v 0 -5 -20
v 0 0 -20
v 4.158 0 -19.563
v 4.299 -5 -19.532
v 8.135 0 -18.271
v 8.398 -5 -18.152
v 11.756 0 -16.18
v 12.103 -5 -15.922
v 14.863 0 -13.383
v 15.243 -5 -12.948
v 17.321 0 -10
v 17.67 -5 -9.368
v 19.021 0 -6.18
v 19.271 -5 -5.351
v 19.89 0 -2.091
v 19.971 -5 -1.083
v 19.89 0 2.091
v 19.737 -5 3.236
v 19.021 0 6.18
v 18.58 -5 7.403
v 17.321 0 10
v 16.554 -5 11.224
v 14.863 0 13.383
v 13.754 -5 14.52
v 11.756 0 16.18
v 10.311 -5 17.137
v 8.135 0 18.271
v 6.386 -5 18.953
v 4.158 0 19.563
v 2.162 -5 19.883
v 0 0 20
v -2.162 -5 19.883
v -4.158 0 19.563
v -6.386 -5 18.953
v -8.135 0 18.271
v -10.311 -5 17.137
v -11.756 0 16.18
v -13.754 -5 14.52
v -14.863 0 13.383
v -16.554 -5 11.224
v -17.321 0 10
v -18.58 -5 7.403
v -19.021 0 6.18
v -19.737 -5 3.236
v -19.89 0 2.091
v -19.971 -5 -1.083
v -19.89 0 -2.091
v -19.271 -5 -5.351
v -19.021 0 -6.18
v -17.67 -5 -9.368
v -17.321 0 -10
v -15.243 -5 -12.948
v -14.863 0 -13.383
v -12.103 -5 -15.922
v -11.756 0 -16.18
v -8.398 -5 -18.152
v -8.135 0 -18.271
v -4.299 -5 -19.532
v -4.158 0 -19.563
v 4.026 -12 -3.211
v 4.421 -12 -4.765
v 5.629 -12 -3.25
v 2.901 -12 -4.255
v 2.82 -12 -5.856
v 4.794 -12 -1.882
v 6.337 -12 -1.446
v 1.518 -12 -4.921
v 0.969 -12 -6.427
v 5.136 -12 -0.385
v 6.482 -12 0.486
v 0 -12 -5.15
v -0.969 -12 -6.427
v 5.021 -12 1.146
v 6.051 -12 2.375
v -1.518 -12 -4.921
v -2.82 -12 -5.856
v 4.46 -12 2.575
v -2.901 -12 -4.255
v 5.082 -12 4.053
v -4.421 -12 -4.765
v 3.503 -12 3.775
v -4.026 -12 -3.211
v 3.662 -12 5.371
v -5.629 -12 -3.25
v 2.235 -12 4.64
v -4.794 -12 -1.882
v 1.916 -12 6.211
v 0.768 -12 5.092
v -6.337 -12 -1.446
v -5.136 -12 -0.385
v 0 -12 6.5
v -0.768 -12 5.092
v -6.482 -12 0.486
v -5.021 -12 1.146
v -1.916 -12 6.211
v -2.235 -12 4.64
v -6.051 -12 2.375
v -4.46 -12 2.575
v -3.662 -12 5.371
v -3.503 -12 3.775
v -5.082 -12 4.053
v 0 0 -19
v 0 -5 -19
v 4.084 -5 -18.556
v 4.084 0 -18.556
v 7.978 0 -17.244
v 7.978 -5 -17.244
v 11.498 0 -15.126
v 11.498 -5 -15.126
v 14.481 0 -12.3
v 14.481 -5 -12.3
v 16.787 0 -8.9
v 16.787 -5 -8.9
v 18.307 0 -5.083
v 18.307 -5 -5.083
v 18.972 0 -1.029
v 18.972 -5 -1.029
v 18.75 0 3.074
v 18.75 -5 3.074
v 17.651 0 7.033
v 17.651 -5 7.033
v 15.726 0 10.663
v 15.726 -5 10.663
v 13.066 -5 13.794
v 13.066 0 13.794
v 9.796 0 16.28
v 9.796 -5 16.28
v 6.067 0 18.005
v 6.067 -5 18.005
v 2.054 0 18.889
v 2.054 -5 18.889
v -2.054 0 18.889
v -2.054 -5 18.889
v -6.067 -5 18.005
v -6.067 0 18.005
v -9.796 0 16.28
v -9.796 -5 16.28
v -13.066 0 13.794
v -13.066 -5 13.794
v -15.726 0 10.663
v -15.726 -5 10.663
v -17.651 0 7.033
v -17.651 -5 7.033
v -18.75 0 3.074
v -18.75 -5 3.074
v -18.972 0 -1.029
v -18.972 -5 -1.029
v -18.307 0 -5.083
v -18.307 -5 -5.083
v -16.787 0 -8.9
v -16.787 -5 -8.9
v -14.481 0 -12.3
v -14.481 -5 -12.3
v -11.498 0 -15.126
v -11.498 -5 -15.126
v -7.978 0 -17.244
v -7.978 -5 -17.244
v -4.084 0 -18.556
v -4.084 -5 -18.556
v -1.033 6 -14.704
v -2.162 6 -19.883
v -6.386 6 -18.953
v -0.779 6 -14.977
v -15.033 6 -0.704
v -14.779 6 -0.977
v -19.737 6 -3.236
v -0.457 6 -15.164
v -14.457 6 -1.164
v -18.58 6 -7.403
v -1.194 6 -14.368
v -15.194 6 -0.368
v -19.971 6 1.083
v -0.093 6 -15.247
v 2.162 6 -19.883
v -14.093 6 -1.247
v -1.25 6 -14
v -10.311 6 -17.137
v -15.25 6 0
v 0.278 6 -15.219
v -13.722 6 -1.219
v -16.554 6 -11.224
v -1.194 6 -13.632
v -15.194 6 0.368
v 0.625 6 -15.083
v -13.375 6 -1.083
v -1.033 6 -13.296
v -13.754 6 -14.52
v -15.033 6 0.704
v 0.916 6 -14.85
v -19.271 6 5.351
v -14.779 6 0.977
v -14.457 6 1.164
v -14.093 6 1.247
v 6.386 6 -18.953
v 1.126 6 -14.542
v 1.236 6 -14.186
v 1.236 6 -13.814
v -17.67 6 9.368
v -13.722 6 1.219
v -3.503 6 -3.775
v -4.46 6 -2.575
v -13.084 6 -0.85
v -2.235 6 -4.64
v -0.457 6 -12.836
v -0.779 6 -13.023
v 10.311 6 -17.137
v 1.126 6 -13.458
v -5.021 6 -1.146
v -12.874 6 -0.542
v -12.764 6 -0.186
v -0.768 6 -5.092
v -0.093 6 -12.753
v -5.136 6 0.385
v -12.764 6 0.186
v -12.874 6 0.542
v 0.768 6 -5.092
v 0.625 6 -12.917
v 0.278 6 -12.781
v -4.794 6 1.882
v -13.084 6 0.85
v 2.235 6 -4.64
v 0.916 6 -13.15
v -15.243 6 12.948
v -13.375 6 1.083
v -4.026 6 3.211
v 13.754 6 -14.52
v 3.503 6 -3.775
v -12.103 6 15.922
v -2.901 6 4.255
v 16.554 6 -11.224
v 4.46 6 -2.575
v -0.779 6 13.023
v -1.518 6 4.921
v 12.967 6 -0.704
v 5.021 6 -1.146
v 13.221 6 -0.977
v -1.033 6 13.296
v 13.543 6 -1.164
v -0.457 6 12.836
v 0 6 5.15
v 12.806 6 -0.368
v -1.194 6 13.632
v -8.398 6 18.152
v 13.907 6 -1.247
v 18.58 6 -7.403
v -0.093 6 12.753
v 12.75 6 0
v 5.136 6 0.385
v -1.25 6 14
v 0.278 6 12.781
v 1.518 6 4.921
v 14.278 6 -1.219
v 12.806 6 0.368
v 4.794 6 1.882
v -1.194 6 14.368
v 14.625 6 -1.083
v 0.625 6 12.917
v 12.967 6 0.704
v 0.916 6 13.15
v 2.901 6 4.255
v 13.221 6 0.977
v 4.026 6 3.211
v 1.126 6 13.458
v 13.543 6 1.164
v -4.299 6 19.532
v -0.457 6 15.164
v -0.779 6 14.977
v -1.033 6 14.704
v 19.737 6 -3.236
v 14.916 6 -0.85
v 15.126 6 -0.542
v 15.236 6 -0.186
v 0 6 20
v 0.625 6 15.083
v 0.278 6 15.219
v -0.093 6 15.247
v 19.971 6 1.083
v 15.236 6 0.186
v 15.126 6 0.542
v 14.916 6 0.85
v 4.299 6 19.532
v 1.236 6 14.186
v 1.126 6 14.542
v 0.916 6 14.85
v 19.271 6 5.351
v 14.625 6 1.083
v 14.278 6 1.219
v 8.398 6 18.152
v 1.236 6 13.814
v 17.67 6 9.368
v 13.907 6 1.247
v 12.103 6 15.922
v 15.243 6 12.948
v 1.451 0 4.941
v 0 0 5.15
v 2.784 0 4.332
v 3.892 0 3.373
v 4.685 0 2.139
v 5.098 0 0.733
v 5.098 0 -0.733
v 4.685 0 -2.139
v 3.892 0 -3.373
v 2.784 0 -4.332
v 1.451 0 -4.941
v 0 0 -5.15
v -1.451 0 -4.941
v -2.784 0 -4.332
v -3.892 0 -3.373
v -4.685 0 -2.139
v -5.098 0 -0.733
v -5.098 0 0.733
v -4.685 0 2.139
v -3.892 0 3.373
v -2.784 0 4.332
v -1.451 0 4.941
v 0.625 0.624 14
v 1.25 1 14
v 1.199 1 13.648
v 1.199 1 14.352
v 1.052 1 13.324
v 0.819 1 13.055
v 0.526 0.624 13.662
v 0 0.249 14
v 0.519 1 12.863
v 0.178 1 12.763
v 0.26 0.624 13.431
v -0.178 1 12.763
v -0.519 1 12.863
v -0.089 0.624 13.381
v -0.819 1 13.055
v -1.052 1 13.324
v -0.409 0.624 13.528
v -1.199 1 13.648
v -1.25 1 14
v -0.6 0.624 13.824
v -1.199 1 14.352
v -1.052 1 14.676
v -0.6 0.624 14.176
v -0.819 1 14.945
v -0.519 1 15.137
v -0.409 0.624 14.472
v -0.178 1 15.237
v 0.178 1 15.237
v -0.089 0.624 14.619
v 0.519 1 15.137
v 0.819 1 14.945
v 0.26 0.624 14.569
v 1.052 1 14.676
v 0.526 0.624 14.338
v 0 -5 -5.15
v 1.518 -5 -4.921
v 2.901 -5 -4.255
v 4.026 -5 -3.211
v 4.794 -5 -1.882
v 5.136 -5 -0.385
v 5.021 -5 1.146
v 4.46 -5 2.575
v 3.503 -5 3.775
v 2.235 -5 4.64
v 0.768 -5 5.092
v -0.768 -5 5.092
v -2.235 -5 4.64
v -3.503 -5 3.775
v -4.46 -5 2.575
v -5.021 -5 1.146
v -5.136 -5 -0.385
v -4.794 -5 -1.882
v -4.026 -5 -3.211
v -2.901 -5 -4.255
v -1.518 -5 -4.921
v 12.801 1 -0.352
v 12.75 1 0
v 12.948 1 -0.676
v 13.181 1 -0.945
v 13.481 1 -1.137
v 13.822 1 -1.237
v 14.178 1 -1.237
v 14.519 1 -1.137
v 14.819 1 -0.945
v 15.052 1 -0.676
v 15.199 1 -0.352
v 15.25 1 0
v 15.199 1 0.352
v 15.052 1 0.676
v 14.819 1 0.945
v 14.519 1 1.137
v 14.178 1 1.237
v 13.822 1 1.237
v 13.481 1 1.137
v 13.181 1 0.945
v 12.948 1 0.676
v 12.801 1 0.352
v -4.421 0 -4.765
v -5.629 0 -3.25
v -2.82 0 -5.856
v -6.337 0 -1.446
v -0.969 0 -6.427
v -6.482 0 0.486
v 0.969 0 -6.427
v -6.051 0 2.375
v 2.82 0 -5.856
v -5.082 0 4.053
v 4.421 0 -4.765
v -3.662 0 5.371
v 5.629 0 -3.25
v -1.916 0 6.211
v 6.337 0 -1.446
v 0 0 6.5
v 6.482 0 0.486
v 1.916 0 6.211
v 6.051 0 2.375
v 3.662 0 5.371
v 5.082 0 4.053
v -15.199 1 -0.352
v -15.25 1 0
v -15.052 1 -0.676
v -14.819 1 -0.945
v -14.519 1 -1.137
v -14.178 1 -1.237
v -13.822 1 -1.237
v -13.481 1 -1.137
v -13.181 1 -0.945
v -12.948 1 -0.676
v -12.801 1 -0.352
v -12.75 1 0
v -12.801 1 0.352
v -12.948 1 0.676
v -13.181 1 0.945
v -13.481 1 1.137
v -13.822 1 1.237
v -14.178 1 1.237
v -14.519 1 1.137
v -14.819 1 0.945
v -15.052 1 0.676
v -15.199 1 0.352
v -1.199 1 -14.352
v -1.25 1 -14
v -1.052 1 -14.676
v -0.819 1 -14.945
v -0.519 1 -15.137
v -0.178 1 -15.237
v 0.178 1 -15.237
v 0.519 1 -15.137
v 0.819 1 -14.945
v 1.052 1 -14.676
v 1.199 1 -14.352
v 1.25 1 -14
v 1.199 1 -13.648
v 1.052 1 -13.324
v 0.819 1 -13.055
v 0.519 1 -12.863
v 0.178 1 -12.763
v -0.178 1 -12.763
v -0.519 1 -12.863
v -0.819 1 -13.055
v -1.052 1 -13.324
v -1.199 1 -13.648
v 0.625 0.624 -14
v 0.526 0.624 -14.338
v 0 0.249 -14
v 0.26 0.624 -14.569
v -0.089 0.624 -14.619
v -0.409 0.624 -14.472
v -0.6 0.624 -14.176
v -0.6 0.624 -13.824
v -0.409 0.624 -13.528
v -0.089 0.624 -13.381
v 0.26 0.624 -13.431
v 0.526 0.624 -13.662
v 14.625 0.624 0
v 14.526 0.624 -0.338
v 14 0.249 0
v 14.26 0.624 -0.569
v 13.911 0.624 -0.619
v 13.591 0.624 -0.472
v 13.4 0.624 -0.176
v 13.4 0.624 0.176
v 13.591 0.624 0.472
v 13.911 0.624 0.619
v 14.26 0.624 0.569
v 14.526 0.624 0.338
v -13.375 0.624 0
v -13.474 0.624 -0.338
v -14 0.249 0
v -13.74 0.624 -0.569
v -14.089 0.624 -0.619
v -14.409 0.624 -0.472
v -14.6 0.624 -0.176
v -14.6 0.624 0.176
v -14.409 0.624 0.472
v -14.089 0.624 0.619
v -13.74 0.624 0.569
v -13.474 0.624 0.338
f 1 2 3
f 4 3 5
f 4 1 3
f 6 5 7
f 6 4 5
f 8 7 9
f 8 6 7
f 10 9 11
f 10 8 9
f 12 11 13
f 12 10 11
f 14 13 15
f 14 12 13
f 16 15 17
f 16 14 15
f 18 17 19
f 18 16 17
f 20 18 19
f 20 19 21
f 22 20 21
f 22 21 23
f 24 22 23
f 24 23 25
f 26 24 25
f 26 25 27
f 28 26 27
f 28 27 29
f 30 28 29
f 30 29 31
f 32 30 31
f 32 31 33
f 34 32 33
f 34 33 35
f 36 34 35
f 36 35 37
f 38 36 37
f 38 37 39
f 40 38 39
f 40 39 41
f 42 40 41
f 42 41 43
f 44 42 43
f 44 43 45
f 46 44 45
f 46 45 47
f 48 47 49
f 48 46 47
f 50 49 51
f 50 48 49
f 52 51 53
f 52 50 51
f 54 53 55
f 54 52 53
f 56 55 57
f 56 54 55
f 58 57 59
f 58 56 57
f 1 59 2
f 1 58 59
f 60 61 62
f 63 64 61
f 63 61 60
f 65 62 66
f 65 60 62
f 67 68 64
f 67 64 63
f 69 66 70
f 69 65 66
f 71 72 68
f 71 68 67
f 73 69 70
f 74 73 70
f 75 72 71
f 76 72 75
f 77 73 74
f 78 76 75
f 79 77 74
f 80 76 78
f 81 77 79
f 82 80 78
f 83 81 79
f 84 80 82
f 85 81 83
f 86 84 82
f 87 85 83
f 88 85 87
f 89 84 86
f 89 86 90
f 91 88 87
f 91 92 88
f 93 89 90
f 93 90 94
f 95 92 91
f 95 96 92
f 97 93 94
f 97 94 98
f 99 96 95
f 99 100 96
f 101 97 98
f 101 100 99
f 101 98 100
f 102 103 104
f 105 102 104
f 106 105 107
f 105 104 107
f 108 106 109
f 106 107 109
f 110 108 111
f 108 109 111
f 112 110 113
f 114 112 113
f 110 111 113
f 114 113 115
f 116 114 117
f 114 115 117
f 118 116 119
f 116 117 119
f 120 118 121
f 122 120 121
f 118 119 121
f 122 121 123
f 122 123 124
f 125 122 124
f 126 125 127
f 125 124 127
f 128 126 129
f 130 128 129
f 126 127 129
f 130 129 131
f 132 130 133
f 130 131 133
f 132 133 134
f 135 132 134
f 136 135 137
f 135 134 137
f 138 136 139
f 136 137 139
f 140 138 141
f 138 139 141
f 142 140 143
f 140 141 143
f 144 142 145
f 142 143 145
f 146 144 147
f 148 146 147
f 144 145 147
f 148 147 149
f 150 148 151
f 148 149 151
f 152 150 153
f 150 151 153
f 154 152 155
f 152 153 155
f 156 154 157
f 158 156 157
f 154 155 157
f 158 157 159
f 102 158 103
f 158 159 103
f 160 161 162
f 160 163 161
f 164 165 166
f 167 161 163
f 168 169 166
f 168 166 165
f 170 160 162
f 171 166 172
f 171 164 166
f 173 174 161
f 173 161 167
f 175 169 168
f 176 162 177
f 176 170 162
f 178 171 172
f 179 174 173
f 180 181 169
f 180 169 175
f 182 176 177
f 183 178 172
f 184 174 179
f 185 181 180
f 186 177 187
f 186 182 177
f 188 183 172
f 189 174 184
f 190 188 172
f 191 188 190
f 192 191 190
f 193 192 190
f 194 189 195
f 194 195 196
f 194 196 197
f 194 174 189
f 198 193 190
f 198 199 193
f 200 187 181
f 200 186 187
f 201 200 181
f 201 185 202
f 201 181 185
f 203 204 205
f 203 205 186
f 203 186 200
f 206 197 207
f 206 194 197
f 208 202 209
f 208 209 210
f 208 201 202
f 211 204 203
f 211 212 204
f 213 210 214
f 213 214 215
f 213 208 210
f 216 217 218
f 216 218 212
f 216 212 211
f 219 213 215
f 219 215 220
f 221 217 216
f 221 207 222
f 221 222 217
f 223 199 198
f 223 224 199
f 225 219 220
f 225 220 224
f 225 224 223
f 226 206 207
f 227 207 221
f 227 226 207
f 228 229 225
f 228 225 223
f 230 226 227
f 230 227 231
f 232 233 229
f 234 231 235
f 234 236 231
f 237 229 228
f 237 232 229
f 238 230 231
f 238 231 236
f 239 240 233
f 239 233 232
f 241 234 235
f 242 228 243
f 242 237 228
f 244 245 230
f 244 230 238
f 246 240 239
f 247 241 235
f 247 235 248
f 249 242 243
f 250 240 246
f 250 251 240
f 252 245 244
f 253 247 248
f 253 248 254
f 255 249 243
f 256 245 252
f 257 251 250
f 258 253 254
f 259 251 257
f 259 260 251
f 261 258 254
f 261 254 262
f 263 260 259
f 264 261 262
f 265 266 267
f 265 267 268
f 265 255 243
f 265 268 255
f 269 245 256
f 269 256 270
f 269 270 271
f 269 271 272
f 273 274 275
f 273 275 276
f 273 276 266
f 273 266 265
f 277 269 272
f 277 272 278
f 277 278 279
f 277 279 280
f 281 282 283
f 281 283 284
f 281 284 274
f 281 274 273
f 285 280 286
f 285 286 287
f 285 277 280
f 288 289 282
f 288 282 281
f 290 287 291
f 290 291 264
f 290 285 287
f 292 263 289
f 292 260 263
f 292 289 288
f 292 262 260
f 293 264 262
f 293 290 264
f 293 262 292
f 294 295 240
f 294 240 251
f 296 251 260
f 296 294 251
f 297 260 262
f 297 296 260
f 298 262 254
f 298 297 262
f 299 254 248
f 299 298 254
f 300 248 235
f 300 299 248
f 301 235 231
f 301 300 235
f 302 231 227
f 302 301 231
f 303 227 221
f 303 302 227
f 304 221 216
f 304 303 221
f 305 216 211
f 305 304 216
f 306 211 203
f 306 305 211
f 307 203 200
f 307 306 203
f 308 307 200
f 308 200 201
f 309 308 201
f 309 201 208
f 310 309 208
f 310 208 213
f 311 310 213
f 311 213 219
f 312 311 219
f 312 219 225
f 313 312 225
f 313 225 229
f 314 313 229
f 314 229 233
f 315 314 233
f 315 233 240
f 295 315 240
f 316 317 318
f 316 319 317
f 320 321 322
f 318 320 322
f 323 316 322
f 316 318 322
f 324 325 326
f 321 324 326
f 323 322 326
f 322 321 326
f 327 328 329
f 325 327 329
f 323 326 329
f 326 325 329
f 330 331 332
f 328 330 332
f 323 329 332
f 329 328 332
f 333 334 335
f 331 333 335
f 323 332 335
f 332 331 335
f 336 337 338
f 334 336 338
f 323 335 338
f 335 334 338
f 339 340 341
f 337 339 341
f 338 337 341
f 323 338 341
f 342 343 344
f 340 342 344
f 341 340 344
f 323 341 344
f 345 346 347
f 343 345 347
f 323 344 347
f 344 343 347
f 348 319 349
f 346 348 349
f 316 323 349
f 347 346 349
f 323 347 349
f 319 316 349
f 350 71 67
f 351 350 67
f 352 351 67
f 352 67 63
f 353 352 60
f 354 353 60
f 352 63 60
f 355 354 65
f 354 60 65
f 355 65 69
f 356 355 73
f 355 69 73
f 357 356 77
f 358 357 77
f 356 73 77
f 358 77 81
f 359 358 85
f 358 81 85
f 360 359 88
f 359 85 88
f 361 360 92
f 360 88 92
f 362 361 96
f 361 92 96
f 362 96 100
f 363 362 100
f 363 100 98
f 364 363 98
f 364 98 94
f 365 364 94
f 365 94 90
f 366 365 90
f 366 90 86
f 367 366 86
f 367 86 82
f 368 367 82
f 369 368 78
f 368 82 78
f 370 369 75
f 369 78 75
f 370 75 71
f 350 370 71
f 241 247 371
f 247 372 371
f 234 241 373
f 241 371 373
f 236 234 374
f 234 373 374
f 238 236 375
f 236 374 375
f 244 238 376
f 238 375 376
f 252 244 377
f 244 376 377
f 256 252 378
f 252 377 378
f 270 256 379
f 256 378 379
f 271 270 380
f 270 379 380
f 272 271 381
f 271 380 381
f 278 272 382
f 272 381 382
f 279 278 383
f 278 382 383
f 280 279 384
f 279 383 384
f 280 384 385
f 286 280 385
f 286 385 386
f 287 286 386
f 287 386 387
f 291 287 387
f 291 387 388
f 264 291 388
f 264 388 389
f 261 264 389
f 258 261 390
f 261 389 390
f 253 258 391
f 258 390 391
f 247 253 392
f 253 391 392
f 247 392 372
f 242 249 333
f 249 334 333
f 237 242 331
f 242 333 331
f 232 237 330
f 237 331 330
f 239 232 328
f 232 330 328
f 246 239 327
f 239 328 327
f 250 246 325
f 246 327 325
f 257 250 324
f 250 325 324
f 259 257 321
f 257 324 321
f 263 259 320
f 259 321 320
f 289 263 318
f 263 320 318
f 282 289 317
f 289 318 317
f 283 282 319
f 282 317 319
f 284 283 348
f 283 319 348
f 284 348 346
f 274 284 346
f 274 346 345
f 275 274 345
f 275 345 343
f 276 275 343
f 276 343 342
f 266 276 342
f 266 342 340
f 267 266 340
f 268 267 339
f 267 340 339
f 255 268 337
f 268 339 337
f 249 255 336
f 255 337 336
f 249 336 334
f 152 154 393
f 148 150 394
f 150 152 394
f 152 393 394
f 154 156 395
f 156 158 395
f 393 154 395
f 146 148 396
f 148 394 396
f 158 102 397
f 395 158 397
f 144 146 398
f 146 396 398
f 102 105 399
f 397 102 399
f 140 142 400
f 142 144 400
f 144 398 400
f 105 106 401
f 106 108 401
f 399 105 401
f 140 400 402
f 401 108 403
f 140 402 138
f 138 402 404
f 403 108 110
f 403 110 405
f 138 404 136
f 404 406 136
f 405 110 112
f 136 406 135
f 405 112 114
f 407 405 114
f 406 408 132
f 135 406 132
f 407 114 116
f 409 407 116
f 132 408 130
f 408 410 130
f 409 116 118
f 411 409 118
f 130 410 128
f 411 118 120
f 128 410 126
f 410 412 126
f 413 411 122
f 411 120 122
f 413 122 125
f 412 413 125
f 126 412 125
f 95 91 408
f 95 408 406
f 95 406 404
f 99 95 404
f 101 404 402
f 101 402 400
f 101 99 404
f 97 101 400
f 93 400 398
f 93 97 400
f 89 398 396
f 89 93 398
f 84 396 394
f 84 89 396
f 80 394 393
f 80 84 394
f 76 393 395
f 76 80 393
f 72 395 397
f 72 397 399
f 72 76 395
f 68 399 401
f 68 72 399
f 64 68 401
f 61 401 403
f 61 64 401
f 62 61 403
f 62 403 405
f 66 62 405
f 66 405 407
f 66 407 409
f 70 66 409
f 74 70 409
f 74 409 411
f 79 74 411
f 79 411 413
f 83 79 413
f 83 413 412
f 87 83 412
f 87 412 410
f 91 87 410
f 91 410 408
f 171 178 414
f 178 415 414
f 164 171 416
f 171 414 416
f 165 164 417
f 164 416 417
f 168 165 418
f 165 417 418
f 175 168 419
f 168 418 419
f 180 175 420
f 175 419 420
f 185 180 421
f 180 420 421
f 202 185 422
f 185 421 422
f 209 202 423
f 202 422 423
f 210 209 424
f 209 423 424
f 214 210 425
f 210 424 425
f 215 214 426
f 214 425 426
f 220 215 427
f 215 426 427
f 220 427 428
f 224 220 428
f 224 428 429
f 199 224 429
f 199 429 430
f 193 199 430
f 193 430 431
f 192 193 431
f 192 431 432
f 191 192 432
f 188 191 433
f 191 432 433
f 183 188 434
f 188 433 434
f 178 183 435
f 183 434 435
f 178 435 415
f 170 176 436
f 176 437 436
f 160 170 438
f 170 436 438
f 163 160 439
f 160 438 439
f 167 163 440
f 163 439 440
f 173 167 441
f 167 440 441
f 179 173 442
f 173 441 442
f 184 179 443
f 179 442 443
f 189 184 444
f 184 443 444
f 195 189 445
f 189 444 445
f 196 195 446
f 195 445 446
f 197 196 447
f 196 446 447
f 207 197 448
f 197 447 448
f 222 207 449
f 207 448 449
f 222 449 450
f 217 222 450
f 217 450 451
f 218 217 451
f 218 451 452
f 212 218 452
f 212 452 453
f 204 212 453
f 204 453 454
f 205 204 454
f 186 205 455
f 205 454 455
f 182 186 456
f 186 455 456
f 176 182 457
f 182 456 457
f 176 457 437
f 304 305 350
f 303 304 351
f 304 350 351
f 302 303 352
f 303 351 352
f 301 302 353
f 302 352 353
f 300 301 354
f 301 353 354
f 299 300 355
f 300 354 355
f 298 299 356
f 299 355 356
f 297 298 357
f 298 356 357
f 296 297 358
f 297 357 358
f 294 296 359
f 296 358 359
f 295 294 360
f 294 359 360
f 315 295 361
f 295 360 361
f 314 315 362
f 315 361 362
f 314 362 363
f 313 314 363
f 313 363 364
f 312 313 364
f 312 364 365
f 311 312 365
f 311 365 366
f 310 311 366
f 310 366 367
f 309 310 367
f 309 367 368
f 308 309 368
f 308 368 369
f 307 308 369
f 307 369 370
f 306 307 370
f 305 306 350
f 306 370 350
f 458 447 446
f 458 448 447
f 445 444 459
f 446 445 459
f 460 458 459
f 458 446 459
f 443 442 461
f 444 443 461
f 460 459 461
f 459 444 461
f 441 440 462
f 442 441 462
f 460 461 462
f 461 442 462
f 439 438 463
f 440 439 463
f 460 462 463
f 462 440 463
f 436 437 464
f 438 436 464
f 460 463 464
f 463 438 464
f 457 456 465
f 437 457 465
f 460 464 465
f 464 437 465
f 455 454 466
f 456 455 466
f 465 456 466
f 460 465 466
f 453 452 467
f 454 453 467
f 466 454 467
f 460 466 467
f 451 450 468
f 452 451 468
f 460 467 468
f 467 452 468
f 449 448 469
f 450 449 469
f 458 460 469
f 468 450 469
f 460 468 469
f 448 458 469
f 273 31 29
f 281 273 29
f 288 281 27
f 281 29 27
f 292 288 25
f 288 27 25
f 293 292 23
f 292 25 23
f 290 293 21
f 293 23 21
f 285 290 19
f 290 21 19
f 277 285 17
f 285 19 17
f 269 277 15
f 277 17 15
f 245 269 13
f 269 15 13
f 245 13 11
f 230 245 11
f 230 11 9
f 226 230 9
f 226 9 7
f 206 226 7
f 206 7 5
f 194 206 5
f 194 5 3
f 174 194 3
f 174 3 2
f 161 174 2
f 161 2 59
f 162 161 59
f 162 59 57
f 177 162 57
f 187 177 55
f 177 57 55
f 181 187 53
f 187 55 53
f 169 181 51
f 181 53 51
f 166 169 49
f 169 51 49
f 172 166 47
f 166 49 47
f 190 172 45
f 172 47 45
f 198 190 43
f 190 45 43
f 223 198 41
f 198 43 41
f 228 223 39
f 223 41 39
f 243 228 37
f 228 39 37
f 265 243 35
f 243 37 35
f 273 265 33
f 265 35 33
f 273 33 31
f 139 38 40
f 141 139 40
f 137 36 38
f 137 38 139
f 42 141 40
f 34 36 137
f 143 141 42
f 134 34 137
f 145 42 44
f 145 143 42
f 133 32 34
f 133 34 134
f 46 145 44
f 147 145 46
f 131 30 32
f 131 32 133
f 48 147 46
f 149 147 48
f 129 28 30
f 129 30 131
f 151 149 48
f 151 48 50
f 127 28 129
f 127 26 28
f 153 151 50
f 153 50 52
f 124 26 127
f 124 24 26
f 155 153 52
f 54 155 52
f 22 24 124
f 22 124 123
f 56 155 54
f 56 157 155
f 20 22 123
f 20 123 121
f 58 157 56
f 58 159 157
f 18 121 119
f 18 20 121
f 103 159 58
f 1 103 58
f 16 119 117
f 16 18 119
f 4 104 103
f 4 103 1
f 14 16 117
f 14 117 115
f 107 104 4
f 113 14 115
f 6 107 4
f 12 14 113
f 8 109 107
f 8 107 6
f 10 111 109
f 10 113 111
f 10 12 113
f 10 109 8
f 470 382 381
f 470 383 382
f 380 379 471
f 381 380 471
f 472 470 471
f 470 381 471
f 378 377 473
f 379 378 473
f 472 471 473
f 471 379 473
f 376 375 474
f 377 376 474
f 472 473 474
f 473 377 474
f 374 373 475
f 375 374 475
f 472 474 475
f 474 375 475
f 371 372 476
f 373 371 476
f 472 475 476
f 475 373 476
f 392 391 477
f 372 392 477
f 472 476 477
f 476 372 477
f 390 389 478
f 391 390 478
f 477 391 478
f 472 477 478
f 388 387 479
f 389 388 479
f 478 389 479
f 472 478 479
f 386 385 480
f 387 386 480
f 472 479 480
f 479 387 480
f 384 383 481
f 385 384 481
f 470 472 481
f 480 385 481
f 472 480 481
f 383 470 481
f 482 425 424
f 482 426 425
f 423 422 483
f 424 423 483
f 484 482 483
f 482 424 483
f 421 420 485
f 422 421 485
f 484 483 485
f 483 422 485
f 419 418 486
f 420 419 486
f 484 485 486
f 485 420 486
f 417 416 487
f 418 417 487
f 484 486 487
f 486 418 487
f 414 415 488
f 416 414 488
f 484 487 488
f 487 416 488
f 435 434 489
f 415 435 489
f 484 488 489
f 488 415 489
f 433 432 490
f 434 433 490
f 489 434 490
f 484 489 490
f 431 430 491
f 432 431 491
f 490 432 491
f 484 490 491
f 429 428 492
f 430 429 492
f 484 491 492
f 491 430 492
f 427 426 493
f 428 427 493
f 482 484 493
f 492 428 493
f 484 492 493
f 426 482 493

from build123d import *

# Parameters (mm, degrees)
SKETCH_1_R             = 20
SKETCH_1_R_2           = 5.15
EXTRUDE_1_DEPTH        = 6
EXTRUDE_START          = 5
SKETCH_2_R             = 20
SKETCH_2_R_2           = 19
SKETCH_2_R_3           = 6.5
SKETCH_2_R_4           = 5.15
EXTRUDE_2_DEPTH        = 5
EXTRUDE_START_2        = 7
SKETCH_3_R             = 6.5
SKETCH_3_R_2           = 5.15
EXTRUDE_3_DEPTH        = 7
HOLE_WIZARD_M3_1_D     = 2.5
HOLE_WIZARD_M3_1_DEPTH = 5
HOLE_WIZARD_M3_1_TIP   = 0.751075774


with BuildPart() as part:
    # 草图1 → 凸台-拉伸1 (new body)
    with BuildSketch(Plane(origin=(0, 0, 0), x_dir=(1, 0, 0), z_dir=(0, 1, 0))):
        with Locations(Location((0, 0, 0), (0, 0, 270))):
            Circle(SKETCH_1_R)
        with Locations(Location((0, 0, 0), (0, 0, 270))):
            Circle(SKETCH_1_R_2, mode=Mode.SUBTRACT)
    extrude(amount=EXTRUDE_1_DEPTH)

    # 草图2 → 凸台-拉伸2 (add)
    # profile 1 of 2: a face of its own
    with BuildSketch(Plane.XZ.offset(EXTRUDE_START)):
        with Locations(Location((0, 0, 0), (0, 0, 270))):
            Circle(SKETCH_2_R)
        with Locations(Location((0, 0, 0), (0, 0, 270))):
            Circle(SKETCH_2_R_2, mode=Mode.SUBTRACT)
    # profile 2 of 2: a face of its own
    with BuildSketch(Plane.XZ.offset(EXTRUDE_START)):
        with Locations(Location((0, 0, 0), (0, 0, 90))):
            Circle(SKETCH_2_R_3)
        with Locations(Location((0, 0, 0), (0, 0, 270))):
            Circle(SKETCH_2_R_4, mode=Mode.SUBTRACT)
    extrude(amount=-EXTRUDE_2_DEPTH)

    # 草图3 → 凸台-拉伸3 (add)
    with BuildSketch(Plane.XZ.offset(5).offset(EXTRUDE_START_2)):
        with Locations(Location((0, 0, 0), (0, 0, 90))):
            Circle(SKETCH_3_R)
        with Locations(Location((0, 0, 0), (0, 0, 270))):
            Circle(SKETCH_3_R_2, mode=Mode.SUBTRACT)
    extrude(amount=-EXTRUDE_3_DEPTH)

    # M3 螺纹孔1
    with Locations(Plane(origin=(0, 6, 0), x_dir=(1, 0, 0), z_dir=(0, 1, 0))):
        with Locations((0, 14), (0, -14), (14, 0), (-14, 0)):
            Hole(HOLE_WIZARD_M3_1_D / 2, depth=HOLE_WIZARD_M3_1_DEPTH)
            with Locations((0, 0, -(HOLE_WIZARD_M3_1_DEPTH + HOLE_WIZARD_M3_1_TIP / 2))):  # 118° drill point
                Cone(0, HOLE_WIZARD_M3_1_D / 2, HOLE_WIZARD_M3_1_TIP, mode=Mode.SUBTRACT)


solid = part.part
